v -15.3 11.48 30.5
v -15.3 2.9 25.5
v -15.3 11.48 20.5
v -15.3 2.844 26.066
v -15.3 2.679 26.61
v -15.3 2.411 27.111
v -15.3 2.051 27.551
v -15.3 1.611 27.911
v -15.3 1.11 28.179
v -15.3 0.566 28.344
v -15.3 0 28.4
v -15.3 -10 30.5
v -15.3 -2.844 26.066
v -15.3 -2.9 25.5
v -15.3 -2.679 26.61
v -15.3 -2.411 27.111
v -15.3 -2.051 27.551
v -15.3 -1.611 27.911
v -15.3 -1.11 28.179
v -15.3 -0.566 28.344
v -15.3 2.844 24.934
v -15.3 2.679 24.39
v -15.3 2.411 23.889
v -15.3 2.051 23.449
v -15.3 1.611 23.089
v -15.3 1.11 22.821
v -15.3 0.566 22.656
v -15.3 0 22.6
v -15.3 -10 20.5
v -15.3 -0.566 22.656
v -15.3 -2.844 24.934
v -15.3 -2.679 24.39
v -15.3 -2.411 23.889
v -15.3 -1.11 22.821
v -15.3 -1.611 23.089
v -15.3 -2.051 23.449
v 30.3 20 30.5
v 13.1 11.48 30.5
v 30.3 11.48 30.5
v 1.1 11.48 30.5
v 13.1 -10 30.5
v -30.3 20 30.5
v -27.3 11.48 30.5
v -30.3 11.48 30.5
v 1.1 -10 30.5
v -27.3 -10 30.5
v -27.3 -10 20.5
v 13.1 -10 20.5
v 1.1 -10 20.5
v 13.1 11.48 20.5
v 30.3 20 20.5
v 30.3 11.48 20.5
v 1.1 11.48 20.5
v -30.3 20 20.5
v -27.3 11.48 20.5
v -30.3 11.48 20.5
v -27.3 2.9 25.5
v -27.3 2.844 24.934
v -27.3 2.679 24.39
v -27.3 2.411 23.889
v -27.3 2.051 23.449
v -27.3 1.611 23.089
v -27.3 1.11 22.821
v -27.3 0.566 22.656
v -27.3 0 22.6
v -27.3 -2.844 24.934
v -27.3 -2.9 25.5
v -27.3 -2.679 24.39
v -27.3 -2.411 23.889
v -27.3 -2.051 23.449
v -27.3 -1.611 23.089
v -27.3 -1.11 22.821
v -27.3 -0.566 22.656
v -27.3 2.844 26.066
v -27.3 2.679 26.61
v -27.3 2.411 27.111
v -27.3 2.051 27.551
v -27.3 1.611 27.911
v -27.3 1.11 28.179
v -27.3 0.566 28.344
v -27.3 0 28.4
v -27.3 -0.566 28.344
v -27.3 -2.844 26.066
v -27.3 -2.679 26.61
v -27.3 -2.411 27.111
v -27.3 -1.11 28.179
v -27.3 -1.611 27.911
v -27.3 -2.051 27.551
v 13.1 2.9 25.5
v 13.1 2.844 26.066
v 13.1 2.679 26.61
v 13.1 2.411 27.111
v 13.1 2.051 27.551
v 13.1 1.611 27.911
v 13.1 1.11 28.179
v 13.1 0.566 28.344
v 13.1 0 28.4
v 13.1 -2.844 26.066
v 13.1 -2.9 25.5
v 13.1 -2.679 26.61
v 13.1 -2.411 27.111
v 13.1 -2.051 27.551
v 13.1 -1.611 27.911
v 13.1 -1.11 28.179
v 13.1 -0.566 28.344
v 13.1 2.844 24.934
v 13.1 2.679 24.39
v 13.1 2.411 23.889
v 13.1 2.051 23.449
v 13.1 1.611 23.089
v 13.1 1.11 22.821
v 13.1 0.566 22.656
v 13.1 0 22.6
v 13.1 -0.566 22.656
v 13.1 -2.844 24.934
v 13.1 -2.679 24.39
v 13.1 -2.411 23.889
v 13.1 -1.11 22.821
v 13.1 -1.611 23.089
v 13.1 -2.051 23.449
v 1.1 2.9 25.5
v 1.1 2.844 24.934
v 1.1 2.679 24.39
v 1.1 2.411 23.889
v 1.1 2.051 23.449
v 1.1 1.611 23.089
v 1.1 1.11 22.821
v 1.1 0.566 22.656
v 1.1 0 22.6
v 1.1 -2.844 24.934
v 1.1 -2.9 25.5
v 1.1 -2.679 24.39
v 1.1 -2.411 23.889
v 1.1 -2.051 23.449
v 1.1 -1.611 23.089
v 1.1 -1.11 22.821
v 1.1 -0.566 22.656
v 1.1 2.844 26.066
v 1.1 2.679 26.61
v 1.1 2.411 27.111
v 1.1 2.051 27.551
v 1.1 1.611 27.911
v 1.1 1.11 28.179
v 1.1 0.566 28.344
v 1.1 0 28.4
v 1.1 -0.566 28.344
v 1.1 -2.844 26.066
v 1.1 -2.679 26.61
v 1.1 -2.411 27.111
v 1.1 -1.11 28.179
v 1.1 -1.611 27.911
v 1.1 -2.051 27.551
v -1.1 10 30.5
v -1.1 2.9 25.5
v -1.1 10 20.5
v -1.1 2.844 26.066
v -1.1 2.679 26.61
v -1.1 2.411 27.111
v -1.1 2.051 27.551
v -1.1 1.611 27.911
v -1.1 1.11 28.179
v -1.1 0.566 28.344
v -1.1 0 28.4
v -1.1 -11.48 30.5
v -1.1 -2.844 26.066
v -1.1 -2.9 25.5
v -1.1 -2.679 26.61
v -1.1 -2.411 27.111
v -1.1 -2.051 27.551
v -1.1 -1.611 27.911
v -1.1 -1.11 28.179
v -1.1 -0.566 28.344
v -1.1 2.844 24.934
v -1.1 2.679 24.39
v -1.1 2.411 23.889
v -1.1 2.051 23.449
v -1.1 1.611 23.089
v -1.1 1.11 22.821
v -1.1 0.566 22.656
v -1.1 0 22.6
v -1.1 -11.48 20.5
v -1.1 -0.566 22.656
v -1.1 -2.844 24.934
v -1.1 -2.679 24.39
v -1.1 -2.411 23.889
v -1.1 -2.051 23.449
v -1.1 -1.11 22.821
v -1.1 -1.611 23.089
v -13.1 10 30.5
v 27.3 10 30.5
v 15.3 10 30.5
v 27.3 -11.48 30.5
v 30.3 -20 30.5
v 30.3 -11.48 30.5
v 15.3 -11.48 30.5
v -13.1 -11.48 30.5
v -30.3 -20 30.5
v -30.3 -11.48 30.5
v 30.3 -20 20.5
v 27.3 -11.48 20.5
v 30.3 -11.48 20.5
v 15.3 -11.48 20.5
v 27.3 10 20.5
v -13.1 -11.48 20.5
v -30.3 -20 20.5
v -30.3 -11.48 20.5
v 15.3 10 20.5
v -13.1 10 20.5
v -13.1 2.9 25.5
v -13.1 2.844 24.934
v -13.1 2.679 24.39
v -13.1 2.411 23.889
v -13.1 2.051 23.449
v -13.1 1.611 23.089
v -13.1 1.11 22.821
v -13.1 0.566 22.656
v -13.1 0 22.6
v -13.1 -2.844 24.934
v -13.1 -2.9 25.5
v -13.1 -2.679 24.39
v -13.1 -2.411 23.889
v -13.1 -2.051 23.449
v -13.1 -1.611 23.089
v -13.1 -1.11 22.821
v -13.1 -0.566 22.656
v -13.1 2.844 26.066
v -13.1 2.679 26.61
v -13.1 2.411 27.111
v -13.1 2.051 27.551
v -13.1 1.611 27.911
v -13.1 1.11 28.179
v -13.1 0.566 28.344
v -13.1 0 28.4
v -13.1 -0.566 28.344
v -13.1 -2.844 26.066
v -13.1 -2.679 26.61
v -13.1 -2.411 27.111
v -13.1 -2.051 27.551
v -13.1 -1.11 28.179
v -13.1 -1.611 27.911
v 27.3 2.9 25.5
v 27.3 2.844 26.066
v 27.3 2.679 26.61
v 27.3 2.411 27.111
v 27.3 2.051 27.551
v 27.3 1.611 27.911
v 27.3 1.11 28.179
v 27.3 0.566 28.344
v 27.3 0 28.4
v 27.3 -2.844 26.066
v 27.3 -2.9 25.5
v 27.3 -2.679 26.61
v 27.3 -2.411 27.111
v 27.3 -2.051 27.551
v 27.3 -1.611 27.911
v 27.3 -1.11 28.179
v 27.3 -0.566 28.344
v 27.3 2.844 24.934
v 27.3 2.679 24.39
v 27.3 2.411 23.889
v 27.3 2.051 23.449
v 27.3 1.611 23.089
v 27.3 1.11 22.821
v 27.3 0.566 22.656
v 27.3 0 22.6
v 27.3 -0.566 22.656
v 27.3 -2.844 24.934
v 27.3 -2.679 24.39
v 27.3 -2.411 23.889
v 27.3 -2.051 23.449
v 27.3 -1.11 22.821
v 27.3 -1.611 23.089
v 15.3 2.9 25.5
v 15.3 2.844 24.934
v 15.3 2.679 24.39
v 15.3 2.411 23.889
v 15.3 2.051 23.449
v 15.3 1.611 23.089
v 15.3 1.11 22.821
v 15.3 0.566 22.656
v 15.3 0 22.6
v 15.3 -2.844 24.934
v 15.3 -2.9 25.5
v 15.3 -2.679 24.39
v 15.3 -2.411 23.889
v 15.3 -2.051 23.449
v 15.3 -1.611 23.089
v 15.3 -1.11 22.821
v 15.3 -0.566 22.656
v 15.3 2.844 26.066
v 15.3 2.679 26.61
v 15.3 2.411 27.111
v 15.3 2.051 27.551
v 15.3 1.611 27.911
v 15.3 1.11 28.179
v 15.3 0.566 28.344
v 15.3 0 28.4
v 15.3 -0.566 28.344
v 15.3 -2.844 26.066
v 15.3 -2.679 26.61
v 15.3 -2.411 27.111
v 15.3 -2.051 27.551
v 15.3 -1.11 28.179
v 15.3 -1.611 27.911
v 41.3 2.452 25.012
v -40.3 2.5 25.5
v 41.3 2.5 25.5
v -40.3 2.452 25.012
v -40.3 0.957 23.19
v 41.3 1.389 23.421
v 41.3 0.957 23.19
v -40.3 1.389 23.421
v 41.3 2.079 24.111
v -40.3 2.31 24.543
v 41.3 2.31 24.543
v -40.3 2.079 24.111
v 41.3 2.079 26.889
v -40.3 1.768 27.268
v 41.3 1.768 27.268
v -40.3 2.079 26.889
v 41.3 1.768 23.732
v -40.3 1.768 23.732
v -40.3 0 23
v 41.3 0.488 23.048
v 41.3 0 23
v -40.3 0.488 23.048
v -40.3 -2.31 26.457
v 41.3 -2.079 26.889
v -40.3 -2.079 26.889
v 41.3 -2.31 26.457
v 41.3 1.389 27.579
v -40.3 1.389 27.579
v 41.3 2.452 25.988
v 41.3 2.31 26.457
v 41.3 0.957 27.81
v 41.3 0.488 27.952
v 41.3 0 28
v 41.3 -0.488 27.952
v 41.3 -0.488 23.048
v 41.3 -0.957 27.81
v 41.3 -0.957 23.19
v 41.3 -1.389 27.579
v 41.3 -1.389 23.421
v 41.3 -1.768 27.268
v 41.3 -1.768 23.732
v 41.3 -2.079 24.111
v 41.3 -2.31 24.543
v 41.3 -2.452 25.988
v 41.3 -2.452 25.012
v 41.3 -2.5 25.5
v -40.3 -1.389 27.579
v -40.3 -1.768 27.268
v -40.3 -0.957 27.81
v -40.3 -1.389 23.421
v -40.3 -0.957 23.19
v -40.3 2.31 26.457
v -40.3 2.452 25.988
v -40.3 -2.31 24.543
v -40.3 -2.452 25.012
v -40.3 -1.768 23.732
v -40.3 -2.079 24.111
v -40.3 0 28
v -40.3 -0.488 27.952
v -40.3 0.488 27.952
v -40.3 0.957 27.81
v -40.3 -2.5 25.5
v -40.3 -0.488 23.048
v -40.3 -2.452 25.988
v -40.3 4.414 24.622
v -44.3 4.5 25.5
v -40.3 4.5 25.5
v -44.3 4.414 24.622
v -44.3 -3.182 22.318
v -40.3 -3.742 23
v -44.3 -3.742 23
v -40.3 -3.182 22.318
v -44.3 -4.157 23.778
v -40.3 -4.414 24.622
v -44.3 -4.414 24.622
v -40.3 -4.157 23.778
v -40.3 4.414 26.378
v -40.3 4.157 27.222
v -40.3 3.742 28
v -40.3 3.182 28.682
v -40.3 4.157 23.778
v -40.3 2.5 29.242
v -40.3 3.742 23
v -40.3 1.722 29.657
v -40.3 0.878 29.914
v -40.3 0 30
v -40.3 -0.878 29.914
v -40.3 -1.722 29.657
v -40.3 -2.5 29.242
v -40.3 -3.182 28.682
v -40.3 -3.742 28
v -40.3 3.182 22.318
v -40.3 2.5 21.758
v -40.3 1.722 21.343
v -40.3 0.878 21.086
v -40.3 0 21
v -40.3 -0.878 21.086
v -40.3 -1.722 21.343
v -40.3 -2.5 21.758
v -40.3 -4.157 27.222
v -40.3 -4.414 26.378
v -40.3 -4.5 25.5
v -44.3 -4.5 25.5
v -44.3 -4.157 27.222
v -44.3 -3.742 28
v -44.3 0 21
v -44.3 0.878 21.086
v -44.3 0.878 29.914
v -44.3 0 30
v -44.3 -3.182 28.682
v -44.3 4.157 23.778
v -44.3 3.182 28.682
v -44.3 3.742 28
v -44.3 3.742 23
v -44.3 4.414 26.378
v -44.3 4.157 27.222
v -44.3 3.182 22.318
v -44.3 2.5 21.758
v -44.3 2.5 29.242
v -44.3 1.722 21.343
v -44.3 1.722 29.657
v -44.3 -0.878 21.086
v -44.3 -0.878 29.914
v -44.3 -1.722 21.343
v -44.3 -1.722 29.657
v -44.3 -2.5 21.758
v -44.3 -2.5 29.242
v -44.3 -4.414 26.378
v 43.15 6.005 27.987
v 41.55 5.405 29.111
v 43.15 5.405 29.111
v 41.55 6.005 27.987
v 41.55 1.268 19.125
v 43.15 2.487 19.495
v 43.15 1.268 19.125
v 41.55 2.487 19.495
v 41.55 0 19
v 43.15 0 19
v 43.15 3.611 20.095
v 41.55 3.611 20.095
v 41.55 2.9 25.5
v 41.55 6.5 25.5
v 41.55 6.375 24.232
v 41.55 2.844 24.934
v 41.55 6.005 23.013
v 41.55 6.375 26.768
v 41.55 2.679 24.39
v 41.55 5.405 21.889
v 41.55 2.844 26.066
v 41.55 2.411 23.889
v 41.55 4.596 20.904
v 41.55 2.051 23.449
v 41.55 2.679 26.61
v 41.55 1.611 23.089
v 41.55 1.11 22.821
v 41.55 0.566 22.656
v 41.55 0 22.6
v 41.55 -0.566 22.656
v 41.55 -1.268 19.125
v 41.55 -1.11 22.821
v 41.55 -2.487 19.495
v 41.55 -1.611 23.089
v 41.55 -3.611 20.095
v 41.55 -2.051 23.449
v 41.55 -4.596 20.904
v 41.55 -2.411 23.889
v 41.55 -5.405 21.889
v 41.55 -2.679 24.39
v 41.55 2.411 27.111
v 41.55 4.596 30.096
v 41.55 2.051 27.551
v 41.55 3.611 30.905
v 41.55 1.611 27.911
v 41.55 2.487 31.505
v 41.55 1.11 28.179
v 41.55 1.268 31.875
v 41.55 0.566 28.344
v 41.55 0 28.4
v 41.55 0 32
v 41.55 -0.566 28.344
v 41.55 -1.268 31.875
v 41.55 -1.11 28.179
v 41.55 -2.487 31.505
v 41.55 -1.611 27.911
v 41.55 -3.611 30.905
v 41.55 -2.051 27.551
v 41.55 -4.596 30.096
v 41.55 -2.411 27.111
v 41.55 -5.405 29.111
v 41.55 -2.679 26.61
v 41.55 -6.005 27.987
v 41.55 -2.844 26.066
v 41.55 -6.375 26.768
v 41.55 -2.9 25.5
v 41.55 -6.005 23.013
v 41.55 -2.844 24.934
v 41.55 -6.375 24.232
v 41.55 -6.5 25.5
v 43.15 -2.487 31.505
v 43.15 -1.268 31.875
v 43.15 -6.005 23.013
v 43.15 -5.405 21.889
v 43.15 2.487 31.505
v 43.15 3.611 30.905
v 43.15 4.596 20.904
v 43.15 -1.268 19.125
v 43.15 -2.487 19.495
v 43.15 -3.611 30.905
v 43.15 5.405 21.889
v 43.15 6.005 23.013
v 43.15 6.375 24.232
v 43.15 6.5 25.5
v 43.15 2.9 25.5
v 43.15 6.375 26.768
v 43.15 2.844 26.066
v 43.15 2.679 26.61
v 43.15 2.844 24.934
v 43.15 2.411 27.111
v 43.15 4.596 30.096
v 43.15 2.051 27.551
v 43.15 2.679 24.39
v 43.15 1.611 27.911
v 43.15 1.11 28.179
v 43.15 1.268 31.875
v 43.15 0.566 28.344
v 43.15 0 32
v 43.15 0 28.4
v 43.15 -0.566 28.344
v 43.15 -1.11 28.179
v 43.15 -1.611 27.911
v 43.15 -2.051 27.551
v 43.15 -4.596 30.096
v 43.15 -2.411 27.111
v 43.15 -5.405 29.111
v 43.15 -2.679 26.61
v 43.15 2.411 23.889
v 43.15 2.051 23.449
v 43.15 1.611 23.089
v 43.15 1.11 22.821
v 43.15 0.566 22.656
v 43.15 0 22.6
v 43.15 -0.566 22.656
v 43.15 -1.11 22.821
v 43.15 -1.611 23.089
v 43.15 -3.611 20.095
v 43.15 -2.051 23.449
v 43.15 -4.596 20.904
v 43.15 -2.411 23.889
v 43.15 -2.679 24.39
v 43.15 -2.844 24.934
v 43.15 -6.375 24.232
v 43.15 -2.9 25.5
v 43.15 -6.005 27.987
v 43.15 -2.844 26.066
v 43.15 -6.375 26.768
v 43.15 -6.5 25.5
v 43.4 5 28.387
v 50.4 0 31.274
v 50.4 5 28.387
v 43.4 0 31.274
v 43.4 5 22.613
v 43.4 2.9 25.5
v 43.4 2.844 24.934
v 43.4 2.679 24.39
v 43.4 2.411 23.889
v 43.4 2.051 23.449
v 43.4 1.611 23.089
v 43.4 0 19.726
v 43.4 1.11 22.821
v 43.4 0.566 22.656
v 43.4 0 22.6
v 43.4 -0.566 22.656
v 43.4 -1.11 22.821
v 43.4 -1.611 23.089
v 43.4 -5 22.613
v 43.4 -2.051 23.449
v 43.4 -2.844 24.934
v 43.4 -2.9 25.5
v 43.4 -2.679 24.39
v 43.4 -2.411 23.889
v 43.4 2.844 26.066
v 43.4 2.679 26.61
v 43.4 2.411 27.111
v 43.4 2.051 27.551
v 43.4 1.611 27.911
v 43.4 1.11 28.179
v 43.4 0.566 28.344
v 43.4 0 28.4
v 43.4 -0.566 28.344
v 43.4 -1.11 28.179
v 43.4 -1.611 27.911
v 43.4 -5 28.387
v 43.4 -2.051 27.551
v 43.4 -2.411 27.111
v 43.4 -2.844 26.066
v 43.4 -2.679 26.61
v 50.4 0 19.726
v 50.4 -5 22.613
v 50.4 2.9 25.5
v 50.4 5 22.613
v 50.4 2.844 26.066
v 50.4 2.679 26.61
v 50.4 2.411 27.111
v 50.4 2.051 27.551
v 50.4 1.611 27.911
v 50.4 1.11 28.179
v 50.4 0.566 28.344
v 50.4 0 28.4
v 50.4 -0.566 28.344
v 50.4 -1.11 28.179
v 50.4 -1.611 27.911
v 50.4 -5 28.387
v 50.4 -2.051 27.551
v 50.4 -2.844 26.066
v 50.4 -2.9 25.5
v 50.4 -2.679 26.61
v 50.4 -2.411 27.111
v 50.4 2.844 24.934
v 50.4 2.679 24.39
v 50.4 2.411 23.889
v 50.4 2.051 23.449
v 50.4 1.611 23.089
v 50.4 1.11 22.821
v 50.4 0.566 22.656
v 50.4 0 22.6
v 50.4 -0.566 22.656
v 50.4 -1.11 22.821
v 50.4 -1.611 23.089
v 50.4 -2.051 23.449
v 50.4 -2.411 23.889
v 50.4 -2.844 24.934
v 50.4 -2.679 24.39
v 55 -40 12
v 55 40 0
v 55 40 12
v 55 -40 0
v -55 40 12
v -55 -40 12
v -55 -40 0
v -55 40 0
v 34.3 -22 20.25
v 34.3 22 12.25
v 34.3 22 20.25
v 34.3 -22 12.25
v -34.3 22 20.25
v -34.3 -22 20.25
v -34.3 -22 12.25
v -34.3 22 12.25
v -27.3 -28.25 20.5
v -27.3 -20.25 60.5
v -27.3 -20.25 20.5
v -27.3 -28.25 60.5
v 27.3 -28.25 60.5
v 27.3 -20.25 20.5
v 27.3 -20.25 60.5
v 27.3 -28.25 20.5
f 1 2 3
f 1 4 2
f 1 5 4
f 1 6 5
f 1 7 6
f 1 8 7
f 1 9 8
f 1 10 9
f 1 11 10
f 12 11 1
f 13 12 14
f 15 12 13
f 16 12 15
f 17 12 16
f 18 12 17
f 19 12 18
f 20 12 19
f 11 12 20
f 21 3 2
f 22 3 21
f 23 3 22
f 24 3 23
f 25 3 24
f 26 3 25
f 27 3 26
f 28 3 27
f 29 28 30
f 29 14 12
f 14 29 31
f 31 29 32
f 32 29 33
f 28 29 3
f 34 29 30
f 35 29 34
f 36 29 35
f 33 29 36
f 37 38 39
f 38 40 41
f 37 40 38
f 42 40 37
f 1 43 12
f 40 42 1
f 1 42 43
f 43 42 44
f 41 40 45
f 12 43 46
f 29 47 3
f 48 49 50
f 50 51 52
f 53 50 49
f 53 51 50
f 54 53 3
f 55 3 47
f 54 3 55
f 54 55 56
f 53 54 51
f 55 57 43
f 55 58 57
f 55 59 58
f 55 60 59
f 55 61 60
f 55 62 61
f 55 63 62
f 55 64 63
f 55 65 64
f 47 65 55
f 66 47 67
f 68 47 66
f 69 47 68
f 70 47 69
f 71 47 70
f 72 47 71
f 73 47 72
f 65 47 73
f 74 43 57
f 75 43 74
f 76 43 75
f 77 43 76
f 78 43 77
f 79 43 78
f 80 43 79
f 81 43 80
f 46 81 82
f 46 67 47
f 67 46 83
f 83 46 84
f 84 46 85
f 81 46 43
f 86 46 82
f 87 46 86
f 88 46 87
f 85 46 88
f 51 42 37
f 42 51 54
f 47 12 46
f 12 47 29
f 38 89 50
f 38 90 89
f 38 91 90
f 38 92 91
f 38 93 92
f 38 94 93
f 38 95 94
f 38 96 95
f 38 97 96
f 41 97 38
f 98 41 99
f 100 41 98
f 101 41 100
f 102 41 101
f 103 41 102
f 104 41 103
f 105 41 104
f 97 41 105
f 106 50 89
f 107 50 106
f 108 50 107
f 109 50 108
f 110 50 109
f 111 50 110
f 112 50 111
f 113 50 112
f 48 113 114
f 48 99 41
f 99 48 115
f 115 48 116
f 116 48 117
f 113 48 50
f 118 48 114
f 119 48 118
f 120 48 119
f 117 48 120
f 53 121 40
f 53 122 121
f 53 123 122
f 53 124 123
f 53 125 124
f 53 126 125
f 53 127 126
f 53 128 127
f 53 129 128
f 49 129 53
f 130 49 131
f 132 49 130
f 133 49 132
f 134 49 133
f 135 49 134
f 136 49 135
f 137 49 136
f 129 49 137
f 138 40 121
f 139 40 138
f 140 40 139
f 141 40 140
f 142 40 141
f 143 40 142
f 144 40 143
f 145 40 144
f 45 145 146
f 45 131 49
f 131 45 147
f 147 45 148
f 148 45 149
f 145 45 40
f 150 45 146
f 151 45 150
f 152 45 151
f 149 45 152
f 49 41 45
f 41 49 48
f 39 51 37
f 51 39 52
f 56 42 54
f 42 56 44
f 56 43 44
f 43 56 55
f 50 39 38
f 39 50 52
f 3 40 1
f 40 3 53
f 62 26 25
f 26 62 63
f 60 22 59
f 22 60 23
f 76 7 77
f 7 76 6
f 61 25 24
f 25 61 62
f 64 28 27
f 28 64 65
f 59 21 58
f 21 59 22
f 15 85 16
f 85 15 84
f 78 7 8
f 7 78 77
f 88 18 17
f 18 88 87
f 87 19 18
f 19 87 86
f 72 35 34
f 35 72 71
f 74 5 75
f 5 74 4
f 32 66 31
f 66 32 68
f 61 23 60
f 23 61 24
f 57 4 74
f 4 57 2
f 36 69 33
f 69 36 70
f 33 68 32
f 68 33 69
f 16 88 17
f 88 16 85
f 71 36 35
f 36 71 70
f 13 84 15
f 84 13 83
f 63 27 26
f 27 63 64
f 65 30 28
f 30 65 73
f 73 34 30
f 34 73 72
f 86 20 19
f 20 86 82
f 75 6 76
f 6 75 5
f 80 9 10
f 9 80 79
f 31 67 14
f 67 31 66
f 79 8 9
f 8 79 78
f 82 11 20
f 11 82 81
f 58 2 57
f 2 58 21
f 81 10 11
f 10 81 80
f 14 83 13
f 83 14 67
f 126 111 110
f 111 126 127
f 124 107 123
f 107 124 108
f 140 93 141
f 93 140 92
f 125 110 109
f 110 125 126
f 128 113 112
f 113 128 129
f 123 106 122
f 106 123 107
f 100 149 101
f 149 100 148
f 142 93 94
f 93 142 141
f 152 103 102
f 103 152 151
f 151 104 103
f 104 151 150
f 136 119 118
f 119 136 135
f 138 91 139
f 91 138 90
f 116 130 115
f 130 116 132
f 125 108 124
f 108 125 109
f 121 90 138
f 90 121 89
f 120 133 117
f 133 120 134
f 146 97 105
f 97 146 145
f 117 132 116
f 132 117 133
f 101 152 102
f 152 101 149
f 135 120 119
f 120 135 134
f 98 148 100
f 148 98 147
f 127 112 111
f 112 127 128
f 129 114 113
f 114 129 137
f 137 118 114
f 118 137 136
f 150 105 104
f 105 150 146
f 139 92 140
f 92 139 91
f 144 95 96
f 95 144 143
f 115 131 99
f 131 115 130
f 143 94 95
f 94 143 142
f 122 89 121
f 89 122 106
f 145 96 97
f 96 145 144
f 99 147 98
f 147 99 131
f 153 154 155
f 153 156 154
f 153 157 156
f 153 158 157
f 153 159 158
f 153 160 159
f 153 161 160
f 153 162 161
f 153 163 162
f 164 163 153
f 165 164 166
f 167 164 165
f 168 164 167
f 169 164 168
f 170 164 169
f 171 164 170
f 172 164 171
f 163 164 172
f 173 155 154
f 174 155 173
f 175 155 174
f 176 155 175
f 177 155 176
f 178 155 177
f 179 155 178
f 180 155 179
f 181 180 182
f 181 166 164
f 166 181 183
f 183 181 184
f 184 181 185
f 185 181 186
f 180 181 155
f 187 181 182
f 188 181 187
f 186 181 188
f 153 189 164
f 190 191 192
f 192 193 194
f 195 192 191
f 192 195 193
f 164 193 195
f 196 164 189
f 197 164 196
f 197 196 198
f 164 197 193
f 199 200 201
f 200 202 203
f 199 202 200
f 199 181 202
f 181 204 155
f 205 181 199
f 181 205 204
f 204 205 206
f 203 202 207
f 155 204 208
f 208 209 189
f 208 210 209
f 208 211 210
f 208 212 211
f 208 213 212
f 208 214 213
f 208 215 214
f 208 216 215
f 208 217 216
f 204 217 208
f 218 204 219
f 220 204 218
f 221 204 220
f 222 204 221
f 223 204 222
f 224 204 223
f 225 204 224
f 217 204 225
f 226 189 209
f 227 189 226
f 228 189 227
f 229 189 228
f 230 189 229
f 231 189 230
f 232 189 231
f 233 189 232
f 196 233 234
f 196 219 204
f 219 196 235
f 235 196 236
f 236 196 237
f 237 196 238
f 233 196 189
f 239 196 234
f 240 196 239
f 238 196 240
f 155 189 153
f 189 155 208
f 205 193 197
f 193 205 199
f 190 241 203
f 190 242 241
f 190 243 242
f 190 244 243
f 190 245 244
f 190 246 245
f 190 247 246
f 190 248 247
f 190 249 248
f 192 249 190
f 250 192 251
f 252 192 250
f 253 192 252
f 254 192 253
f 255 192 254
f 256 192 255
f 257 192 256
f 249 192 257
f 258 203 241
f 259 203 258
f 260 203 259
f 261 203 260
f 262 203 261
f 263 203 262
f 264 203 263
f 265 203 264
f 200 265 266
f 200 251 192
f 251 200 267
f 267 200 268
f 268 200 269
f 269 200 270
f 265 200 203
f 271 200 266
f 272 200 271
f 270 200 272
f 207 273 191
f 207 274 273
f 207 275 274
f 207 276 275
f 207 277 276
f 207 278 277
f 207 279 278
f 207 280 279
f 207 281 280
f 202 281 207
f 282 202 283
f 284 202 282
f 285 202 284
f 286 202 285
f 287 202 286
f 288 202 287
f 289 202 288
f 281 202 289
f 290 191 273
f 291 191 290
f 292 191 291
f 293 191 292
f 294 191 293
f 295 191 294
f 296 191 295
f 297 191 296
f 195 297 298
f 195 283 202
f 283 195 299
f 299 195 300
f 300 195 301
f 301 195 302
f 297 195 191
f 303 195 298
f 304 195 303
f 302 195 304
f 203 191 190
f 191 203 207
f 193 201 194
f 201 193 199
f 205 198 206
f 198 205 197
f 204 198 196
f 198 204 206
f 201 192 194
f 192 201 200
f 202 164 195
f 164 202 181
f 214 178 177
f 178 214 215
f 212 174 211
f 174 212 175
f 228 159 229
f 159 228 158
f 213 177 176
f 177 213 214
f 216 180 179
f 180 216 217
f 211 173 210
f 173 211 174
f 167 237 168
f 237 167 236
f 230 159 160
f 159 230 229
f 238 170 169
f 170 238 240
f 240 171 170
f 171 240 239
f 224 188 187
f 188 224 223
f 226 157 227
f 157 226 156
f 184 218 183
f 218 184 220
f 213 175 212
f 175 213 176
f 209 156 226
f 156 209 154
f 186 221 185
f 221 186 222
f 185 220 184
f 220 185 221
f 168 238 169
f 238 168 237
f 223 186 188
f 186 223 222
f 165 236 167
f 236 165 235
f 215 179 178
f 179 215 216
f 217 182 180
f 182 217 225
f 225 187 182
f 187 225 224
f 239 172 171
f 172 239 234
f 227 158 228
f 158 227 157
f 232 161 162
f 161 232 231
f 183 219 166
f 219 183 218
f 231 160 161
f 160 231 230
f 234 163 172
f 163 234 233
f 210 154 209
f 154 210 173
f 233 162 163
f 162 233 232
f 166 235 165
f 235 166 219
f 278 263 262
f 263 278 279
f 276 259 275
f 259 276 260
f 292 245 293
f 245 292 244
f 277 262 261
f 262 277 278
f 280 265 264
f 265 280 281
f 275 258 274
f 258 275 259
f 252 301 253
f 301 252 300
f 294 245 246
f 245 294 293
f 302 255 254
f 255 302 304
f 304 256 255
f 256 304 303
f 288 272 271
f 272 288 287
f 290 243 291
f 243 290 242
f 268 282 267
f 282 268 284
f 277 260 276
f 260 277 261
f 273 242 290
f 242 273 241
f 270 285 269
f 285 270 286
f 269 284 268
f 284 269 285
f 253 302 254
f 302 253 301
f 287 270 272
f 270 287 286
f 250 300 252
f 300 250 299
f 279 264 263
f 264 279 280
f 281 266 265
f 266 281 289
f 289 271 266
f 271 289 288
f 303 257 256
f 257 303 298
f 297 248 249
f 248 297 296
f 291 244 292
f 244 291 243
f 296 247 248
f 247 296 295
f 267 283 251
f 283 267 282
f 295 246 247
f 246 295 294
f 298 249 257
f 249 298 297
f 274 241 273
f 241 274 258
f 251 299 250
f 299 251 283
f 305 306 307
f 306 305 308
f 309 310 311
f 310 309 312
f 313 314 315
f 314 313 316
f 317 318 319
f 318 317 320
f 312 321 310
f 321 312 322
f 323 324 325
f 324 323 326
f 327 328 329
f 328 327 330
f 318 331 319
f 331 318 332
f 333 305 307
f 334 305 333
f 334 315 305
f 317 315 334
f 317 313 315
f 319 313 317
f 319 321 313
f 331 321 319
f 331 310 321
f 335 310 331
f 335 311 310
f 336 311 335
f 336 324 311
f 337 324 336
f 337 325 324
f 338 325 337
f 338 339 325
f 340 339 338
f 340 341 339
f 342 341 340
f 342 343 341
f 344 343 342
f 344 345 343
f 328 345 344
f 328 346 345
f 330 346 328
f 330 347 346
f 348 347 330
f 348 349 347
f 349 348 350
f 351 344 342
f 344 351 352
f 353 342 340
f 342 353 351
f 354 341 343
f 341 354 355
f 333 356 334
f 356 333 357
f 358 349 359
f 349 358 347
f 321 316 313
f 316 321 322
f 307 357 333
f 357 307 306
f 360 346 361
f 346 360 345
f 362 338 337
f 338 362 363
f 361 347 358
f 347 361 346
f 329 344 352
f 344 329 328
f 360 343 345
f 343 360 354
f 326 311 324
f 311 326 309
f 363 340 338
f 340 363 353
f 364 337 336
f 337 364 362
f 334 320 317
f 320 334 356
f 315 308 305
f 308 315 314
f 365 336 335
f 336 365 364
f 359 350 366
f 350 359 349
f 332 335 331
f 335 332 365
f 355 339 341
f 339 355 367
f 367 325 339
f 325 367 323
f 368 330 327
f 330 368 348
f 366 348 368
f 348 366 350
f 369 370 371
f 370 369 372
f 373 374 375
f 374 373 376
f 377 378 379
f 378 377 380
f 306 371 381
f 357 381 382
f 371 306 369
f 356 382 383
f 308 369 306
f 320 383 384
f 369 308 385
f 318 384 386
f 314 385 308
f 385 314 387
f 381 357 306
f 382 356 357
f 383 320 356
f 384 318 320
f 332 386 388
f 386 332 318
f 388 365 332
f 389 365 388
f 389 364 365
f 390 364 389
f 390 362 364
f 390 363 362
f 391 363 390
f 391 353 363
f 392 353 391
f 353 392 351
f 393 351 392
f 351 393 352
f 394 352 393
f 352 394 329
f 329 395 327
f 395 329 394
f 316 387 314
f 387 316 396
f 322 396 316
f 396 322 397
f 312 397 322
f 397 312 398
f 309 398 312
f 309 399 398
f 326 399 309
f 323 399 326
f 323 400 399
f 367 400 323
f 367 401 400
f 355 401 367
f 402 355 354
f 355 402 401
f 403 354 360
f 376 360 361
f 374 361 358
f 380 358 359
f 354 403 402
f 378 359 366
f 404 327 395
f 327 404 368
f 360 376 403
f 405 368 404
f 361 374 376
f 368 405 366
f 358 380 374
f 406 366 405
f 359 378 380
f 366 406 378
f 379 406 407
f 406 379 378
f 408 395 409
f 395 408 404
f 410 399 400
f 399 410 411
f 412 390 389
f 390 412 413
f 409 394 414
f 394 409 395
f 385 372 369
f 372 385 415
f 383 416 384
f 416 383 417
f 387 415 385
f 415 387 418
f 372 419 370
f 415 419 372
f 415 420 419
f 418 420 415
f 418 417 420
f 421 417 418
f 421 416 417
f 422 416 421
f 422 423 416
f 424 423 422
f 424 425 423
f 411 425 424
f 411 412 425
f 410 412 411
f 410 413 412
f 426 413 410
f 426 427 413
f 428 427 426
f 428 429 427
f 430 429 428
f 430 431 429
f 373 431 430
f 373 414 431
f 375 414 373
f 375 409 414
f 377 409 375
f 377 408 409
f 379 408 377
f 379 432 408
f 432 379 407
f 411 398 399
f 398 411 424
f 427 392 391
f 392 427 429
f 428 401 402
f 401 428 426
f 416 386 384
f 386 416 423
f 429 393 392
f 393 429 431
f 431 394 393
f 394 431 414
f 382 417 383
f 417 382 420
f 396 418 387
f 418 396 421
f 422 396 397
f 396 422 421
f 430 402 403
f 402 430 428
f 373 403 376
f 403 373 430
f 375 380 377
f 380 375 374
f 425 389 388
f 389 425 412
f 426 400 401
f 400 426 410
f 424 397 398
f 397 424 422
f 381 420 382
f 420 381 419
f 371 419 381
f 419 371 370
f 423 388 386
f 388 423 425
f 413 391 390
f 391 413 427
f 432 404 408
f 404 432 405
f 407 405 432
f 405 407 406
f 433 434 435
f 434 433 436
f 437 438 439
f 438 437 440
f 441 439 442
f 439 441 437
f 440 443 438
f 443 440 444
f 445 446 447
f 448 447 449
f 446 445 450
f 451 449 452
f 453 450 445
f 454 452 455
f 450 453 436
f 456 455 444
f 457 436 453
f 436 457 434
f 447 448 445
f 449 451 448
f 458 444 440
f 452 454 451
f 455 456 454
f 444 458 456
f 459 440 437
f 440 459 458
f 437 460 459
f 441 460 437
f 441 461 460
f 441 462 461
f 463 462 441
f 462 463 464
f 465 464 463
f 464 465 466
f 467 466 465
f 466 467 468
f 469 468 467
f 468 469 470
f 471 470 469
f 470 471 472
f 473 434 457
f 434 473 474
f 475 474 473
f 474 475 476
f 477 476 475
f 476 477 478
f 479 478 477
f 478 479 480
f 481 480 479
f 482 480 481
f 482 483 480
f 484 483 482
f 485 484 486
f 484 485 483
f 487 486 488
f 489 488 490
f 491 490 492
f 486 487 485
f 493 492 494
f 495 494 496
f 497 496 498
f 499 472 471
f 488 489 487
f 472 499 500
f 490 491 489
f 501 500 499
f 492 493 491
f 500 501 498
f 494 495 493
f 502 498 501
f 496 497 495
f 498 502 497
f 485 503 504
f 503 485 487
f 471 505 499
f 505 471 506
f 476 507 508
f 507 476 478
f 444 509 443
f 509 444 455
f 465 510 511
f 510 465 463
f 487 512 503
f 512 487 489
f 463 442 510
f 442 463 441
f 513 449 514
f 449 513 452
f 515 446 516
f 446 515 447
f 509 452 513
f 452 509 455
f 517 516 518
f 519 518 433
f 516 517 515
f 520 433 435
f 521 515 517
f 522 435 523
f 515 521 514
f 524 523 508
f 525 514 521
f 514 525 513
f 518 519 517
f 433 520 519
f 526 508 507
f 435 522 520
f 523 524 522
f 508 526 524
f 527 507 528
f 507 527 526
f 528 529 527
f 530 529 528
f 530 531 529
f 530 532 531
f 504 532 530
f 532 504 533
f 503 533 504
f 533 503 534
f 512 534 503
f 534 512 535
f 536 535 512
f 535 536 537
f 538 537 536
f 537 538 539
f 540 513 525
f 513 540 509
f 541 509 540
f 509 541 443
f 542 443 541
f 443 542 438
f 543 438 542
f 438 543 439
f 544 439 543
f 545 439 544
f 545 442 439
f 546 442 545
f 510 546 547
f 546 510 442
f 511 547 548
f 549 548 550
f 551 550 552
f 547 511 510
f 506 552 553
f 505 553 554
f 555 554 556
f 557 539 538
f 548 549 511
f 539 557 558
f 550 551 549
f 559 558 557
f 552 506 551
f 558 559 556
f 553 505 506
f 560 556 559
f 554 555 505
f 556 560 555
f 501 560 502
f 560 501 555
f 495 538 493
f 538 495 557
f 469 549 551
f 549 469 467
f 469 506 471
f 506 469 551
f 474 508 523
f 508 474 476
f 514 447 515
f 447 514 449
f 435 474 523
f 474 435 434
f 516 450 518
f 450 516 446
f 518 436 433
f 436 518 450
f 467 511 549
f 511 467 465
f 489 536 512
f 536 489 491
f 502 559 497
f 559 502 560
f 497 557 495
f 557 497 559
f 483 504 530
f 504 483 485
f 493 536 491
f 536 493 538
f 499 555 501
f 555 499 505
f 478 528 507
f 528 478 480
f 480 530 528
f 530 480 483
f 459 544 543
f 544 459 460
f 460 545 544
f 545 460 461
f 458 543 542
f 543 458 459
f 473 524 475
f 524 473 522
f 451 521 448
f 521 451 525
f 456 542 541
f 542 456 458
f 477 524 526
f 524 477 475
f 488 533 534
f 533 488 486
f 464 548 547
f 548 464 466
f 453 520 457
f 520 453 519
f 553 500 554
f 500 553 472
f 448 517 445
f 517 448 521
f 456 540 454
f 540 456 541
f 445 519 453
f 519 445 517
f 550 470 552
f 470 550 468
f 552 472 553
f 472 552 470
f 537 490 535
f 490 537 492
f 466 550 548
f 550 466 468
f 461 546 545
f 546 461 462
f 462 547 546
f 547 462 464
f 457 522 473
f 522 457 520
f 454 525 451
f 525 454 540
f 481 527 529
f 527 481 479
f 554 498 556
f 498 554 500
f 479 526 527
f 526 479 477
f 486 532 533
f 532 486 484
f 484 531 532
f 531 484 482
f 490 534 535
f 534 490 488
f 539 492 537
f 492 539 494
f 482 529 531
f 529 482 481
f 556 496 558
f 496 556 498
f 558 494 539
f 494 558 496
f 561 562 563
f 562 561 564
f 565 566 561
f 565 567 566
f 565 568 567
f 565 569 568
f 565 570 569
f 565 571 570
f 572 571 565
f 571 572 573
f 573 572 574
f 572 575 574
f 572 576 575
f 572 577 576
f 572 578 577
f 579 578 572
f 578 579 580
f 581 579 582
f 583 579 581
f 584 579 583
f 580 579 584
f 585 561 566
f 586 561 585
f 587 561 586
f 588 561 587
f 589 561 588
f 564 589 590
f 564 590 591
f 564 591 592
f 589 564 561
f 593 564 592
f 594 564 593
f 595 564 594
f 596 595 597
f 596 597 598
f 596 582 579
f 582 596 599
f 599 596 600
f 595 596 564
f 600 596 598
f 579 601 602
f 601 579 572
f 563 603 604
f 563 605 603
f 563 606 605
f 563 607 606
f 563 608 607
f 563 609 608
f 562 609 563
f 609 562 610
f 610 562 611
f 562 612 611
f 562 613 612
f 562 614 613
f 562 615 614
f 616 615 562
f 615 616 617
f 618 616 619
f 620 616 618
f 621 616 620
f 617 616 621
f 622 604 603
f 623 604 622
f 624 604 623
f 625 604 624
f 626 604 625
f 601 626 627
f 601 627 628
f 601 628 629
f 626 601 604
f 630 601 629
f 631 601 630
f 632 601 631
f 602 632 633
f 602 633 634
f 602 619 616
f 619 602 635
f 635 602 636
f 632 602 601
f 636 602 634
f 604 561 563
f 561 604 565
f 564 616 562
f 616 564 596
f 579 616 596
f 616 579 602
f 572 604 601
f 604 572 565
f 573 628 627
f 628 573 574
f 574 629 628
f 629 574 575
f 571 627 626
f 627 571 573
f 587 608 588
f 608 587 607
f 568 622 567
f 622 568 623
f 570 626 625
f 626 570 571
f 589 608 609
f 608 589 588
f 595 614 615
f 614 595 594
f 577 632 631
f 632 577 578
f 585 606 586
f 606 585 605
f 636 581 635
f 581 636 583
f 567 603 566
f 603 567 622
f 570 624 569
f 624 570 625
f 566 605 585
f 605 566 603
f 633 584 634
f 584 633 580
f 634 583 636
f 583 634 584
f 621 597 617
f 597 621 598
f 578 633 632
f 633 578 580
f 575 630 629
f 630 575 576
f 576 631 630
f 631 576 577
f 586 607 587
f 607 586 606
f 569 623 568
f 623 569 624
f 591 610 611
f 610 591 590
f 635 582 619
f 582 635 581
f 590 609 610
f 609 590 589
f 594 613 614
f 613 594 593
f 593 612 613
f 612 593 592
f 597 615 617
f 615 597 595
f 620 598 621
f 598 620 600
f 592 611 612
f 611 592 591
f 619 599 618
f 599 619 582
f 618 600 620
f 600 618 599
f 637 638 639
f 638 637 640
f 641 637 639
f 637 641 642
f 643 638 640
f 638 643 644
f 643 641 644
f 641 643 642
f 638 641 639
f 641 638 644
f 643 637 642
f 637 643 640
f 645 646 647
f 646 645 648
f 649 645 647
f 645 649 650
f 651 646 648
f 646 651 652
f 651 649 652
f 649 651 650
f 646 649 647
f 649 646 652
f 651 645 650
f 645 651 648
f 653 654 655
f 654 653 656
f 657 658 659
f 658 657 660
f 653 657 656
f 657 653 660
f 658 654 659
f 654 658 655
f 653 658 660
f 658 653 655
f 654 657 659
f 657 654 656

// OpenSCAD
$fn = 32;

// ------------------------------------------------------------------------
// Comb hinge with flap: leaf 60.6 x 20 mm, pin d5, flap 40 mm
// Every part is its own module, assembly() places every instance.
// ------------------------------------------------------------------------

// --- part 1 ---
module hinge_bed() {
  difference() {
    translate([-55, -40, 0]) cube([110, 80, 12]);
  }
}

// --- part 2 ---
module hinge_riser() {
  difference() {
    translate([-34.3, -22, 0]) cube([68.6, 44, 8]);
  }
}

// --- part 3 ---
module hinge_leaf_a() {
  difference() {
    union() {
      translate([-27.3, -10, -5]) cube([12, 30, 10]);
      translate([1.1, -10, -5]) cube([12, 30, 10]);
      translate([-30.3, 11.48, -5]) cube([60.6, 8.52, 10]);
    }
    translate([-21.3, 0, 0]) rotate([0, 90, 0]) cylinder(h = 14, d = 5.8, center = true);
    translate([7.1, 0, 0]) rotate([0, 90, 0]) cylinder(h = 14, d = 5.8, center = true);
  }
}

// --- part 4 ---
module hinge_leaf_b() {
  difference() {
    union() {
      translate([-13.1, -20, -5]) cube([12, 30, 10]);
      translate([15.3, -20, -5]) cube([12, 30, 10]);
      translate([-30.3, -20, -5]) cube([60.6, 8.52, 10]);
    }
    translate([-7.1, 0, 0]) rotate([0, 90, 0]) cylinder(h = 14, d = 5.8, center = true);
    translate([21.3, 0, 0]) rotate([0, 90, 0]) cylinder(h = 14, d = 5.8, center = true);
  }
}

// --- part 5 ---
module hinge_flap() {
  difference() {
    translate([-27.3, -20, 0]) cube([54.6, 40, 8]);
  }
}

// --- part 6 ---
module hinge_pin() {
  rotate([0, 90, 0]) cylinder(h = 82.6, d = 5, center = true);
  translate([-44.3, 0, 0]) rotate([0, 90, 0]) cylinder(h = 4, d = 9);
}

// --- part 7 ---
module pin_washer() {
  difference() {
      translate([0, 0, 0]) cylinder(h = 1.6, d = 13);
      translate([0, 0, -1]) cylinder(h = 3.6, d = 5.8);
    }
}

// --- part 8 ---
module pin_nut() {
  difference() {
    linear_extrude(height = 7) polygon(points = [[5.774, 0], [2.887, 5], [-2.887, 5], [-5.774, 0], [-2.887, -5], [2.887, -5]]);
    translate([0, 0, -1]) cylinder(h = 9, d = 5.8);
  }
}

// --- assembly ---
module assembly() {
  color([0.80, 0.24, 0.20]) translate([0, 0, 0]) rotate([0, 0, 0]) hinge_bed();
  color([0.20, 0.45, 0.75]) translate([0, 0, 12.25]) rotate([0, 0, 0]) hinge_riser();
  color([0.25, 0.62, 0.32]) translate([0, 0, 25.5]) rotate([0, 0, 0]) hinge_leaf_a();
  color([0.92, 0.70, 0.18]) translate([0, 0, 25.5]) rotate([0, 0, 0]) hinge_leaf_b();
  color([0.58, 0.35, 0.70]) translate([0, -20.25, 40.5]) rotate([90, 0, 0]) hinge_flap();
  color([0.16, 0.66, 0.66]) translate([0, 0, 25.5]) rotate([0, 0, 0]) hinge_pin();
  color([0.85, 0.48, 0.18]) translate([41.55, 0, 25.5]) rotate([0, 90, 0]) pin_washer();
  color([0.55, 0.60, 0.65]) translate([43.4, 0, 25.5]) rotate([0, 90, 0]) pin_nut();
}

assembly();
